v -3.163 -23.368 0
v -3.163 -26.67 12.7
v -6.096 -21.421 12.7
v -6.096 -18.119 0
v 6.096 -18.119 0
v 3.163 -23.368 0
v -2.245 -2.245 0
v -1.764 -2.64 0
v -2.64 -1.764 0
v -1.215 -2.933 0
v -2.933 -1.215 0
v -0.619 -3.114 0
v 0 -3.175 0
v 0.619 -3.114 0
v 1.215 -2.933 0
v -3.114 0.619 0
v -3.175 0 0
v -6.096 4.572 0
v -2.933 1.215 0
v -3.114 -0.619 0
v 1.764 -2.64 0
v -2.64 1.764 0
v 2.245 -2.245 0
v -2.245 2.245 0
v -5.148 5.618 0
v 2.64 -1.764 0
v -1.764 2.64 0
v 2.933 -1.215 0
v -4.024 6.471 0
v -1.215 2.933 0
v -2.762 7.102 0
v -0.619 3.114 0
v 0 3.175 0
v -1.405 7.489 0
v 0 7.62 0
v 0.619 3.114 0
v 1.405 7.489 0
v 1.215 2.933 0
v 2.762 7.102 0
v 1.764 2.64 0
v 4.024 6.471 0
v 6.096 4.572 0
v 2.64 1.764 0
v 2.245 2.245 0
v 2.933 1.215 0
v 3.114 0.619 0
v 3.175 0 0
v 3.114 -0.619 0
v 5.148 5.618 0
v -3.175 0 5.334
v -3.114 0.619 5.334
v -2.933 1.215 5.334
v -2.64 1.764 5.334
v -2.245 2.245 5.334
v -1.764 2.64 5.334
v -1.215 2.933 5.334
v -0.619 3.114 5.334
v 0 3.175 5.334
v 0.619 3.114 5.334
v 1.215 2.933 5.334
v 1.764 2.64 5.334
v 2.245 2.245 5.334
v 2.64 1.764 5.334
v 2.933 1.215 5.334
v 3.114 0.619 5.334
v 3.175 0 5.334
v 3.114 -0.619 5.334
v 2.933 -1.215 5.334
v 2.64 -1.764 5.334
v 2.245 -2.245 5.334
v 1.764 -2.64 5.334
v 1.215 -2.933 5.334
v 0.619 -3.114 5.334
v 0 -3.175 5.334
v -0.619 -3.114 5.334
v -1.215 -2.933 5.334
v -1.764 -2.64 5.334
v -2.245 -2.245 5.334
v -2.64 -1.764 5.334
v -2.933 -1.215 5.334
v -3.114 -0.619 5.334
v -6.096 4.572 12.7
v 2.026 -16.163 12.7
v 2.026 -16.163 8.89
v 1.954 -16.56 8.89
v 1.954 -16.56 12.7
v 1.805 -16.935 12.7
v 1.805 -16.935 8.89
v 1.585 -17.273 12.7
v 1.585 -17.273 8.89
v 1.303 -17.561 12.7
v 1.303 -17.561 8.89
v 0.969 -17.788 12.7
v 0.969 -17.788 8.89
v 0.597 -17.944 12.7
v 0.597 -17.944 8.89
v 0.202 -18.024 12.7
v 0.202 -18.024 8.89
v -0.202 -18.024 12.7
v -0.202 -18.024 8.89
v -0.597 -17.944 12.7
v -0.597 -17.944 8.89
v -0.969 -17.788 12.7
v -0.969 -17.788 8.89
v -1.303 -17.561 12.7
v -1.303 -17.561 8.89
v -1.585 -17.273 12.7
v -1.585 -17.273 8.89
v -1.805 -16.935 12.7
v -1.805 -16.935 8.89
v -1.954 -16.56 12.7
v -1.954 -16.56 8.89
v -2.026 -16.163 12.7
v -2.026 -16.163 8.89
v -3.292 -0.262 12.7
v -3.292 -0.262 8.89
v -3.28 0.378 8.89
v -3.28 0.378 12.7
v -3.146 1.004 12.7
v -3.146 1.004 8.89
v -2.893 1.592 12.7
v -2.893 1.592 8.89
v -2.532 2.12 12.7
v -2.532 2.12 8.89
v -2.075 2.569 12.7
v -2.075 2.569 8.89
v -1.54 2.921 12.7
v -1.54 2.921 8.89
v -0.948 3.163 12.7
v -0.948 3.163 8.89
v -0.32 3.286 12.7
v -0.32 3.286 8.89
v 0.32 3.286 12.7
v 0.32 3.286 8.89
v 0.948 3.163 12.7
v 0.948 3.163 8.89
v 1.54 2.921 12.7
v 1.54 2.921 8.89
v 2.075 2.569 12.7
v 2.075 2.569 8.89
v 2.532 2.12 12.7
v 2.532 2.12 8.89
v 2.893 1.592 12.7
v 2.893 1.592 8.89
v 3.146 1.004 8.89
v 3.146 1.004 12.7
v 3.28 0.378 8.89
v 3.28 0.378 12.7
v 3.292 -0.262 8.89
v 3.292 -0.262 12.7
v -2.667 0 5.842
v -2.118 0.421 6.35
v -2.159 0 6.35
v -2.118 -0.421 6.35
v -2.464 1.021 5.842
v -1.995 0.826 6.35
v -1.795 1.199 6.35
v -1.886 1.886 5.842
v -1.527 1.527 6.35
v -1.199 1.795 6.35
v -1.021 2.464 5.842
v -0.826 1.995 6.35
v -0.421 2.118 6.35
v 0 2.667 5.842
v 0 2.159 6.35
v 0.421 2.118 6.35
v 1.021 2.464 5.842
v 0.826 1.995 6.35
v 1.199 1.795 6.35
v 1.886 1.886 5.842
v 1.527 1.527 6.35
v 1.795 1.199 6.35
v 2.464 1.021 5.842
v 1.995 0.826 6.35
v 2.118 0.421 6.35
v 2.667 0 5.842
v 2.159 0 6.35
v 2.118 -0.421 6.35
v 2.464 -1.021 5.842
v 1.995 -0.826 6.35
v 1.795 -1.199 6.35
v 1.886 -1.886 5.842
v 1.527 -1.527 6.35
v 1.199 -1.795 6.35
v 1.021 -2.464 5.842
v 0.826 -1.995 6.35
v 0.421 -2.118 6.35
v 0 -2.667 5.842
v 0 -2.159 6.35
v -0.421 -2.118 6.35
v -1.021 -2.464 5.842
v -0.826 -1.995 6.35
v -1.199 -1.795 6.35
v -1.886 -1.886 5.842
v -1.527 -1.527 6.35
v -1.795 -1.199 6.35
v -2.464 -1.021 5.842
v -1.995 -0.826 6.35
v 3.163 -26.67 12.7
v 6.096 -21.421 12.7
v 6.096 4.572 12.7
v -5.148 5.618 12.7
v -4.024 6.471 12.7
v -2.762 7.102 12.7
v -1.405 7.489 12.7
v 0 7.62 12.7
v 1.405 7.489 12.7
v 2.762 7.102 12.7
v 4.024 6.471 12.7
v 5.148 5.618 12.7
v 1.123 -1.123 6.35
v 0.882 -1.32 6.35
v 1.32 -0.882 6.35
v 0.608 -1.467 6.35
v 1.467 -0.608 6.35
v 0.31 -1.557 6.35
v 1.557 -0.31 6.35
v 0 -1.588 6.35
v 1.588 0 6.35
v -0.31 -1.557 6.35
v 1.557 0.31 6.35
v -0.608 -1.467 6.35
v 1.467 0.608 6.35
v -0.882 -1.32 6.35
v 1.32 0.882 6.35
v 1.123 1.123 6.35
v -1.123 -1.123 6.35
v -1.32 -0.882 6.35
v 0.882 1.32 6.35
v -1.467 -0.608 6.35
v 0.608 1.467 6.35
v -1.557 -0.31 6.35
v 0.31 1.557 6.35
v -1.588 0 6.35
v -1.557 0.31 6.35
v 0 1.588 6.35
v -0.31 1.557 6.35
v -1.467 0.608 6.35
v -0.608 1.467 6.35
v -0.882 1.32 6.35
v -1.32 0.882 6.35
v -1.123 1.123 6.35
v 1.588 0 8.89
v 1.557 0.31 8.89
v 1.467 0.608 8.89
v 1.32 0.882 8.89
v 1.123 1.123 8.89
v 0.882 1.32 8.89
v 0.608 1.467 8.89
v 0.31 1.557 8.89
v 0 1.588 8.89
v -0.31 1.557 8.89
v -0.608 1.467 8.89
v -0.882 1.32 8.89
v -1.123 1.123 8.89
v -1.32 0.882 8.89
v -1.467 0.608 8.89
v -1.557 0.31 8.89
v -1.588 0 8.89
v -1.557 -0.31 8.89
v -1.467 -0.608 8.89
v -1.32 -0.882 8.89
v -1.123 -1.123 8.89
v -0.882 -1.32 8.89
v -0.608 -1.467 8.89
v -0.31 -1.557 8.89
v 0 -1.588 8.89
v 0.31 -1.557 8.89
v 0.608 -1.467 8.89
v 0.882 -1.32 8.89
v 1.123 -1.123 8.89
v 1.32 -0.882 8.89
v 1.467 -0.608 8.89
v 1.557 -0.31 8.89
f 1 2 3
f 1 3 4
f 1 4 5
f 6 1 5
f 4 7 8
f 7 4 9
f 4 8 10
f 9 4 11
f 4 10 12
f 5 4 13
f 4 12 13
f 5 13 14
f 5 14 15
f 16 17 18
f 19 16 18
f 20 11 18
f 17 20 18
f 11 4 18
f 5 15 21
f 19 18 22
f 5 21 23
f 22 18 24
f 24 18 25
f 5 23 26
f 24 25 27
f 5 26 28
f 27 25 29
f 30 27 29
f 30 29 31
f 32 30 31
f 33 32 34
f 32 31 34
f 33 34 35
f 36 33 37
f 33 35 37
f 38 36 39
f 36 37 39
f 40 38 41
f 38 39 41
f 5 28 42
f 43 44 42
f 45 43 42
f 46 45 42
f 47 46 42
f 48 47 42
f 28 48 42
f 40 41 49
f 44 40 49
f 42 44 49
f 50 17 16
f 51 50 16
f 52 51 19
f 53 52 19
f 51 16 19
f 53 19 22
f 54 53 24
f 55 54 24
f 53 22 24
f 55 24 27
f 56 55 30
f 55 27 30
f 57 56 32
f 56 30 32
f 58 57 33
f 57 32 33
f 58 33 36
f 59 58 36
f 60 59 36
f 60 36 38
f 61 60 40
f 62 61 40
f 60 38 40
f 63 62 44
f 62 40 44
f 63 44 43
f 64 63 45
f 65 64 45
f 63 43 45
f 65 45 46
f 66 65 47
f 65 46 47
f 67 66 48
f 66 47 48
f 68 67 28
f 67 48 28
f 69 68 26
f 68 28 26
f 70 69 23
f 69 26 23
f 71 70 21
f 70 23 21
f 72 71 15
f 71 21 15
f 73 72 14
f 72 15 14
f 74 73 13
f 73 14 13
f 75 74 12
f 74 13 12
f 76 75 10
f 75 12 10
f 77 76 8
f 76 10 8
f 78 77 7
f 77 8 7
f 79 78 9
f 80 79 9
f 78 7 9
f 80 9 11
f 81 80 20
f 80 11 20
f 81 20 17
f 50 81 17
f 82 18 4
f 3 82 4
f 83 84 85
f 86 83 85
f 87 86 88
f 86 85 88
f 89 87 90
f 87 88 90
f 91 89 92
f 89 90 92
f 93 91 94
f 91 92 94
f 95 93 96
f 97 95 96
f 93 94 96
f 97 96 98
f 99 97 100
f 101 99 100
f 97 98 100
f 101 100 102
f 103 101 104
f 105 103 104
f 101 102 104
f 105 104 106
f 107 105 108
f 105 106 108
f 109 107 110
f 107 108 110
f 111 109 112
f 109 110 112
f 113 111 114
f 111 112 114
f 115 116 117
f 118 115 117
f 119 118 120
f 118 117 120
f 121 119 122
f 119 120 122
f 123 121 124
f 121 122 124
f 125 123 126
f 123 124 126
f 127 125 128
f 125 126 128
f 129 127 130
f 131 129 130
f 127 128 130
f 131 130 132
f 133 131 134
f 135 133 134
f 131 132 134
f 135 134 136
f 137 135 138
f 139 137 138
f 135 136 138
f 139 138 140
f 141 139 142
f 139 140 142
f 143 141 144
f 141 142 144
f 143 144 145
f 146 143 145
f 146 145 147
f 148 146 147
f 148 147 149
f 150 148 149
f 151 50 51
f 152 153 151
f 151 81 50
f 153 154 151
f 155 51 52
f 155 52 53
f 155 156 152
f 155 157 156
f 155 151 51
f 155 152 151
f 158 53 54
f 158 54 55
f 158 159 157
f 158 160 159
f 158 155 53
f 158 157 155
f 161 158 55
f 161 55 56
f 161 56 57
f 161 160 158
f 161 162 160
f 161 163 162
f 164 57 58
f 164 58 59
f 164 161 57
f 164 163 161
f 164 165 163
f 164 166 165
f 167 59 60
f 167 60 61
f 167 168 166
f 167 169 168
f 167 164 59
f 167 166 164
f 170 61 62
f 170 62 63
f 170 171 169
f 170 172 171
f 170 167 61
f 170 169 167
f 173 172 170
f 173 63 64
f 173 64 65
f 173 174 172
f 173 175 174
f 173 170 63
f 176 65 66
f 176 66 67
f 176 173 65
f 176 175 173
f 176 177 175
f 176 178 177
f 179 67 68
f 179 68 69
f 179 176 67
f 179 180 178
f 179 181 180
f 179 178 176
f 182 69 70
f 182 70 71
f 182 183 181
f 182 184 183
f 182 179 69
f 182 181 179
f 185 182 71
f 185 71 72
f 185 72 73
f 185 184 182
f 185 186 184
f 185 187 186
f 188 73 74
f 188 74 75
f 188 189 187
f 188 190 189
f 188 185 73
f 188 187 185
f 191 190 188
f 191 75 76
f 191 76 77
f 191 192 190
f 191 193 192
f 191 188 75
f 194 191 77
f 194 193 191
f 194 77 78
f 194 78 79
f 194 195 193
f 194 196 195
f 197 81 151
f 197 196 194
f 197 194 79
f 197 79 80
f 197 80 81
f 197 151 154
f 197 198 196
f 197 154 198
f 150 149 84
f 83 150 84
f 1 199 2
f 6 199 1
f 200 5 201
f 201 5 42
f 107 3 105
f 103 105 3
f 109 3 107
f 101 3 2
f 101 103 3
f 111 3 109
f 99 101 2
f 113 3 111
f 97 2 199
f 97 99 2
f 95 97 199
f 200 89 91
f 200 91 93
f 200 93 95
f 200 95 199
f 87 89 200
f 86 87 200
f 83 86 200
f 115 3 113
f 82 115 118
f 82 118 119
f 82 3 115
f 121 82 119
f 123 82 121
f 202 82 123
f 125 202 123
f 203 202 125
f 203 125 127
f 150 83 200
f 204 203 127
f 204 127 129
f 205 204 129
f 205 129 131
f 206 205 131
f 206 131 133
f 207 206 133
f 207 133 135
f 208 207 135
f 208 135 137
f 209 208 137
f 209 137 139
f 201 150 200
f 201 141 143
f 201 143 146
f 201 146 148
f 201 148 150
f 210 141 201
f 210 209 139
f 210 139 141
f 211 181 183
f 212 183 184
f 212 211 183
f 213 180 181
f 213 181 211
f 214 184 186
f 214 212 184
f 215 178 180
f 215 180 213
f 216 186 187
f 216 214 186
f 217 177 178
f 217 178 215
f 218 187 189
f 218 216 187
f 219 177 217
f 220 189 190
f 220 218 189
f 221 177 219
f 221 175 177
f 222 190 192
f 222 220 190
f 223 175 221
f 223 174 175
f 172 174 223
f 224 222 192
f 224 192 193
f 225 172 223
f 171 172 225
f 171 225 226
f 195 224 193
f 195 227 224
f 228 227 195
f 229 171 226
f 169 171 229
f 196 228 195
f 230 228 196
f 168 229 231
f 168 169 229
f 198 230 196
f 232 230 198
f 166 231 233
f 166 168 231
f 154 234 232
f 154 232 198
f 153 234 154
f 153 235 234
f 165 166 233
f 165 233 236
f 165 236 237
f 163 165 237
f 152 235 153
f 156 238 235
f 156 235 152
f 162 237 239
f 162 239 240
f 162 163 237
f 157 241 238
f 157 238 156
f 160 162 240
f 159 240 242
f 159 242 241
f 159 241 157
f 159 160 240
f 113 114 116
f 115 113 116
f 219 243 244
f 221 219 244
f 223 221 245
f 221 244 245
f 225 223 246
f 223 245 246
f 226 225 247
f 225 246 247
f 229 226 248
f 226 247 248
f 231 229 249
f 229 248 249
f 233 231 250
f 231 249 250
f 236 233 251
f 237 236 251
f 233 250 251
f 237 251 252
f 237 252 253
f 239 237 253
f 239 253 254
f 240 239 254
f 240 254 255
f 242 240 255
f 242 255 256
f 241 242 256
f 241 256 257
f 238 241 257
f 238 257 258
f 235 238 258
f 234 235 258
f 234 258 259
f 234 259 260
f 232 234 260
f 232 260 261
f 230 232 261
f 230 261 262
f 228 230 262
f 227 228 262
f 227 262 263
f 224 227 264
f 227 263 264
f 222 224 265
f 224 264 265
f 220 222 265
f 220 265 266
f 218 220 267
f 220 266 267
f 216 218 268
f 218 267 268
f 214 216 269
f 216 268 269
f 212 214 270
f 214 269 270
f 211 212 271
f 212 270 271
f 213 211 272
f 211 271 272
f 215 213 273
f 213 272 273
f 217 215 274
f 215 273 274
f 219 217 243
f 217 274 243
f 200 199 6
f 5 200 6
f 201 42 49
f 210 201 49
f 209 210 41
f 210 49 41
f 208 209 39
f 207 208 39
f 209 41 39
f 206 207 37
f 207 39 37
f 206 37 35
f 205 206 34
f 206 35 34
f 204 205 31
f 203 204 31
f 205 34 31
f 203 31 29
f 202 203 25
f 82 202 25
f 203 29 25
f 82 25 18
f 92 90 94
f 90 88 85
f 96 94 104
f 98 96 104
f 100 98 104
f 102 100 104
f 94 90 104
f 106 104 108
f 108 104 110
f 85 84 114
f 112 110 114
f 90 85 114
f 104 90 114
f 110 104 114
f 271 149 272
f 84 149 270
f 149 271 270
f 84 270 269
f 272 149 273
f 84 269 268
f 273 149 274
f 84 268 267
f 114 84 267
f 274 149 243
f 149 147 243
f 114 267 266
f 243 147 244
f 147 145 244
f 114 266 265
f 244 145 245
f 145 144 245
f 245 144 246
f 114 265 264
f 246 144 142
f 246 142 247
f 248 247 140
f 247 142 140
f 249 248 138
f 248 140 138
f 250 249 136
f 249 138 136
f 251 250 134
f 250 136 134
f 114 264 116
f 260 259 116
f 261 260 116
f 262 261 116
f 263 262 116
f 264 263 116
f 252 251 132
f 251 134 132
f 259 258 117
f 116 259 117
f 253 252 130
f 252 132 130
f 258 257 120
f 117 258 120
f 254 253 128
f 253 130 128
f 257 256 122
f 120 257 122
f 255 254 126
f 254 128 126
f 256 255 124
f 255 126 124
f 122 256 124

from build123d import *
from OCP.BRepFilletAPI import BRepFilletAPI_MakeChamfer

# Parameters (mm, degrees)
BOSS_EXTRUDE1_DEPTH     = 12.7
CUT_EXTRUDE1_DEPTH      = 37.367265501
CUT_EXTRUDE1_DEPTH_BACK = 3.81
CUT_EXTRUDE2_DEPTH      = 38.86900643
SKETCH4_R               = 1.5875
CUT_EXTRUDE3_DEPTH      = 29.765990614
SKETCH5_R               = 3.175
CUT_EXTRUDE4_DEPTH      = 6.35
CHAMFER1_SIZE           = 1.016
CHAMFER2_SIZE           = 5.08
CHAMFER2_SIZE2          = 2.932939367


with BuildPart() as part:
    # Sketch1 → Boss-Extrude1 (new body)
    with BuildSketch(Plane.XY):
        with BuildLine():
            Line((-6.096, 4.572), (-6.096, -33.528))
            Line((-6.096, -33.528), (6.096, -33.528))
            Line((6.096, -33.528), (6.096, 4.572))
            ThreePointArc((6.096, 4.572), (0, 7.62), (-6.096, 4.572))
        make_face()
    extrude(amount=BOSS_EXTRUDE1_DEPTH)

    # Sketch2 → Cut-Extrude1 (cut, two sides: drawn at the far end of the back side and taken through both)
    with BuildSketch(Plane.XY.offset(12.7).offset(-CUT_EXTRUDE1_DEPTH_BACK)):
        with BuildLine():
            Line((3.291584227, -0.262063492), (2.025590294, -16.163269841))
            ThreePointArc((2.025590294, -16.163269841), (0, -18.034), (-2.025590294, -16.163269841))
            Line((-2.025590294, -16.163269841), (-3.291584227, -0.262063492))
            ThreePointArc((-3.291584227, -0.262063492), (0, 3.302), (3.291584227, -0.262063492))
        make_face()
    extrude(amount=CUT_EXTRUDE1_DEPTH + CUT_EXTRUDE1_DEPTH_BACK, mode=Mode.SUBTRACT)

    # Sketch3 → Cut-Extrude2 (cut, through all)
    with BuildSketch(Plane(origin=(6.096, 0, 0), x_dir=(0, 0, -1), z_dir=(1, 0, 0))):
        Polygon((-12.7, -33.528), (-12.7, -26.67), (0, -23.368), (0, -33.528), align=None)
    extrude(amount=-CUT_EXTRUDE2_DEPTH, mode=Mode.SUBTRACT)

    # Sketch4 → Cut-Extrude3 (cut, through all)
    with BuildSketch(Plane.XY.offset(8.89)):
        Circle(SKETCH4_R)
    extrude(amount=-CUT_EXTRUDE3_DEPTH, mode=Mode.SUBTRACT)

    # Sketch5 → Cut-Extrude4 (cut)
    with BuildSketch(Plane(origin=(0, 0, 0), x_dir=(-1, 0, 0), z_dir=(0, 0, -1))):
        Circle(SKETCH5_R)
    extrude(amount=-CUT_EXTRUDE4_DEPTH, mode=Mode.SUBTRACT)

    # Chamfer1
    chamfer1_edges = [part.edges().sort_by_distance(p)[0] for p in [
        (3.175, 0, 6.35),
    ]]
    chamfer(chamfer1_edges, length=CHAMFER1_SIZE)

    # Chamfer2: one chamfer whose edges measure the first distance from different faces: ONE call of the kernel's chamfer builder (chamfer() names one face for all edges)
    chamfer2_edges_1 = [part.edges().sort_by_distance(p)[0] for p in [
        (-6.096, -25.019, 6.35),
    ]]
    chamfer2_side_1 = [part.faces().sort_by_distance(p)[0] for p in [
        (-6.096, -10.238852647, 6.468097282),
    ]]
    chamfer2_edges_2 = [part.edges().sort_by_distance(p)[0] for p in [
        (6.096, -25.019, 6.35),
    ]]
    chamfer2_side_2 = [part.faces().sort_by_distance(p)[0] for p in [
        (6.096, -10.238852647, 6.468097282),
    ]]
    chamfer2 = BRepFilletAPI_MakeChamfer(part.part.solid().wrapped)
    for e in chamfer2_edges_1:
        chamfer2.Add(CHAMFER2_SIZE, CHAMFER2_SIZE2, e.wrapped, chamfer2_side_1[0].wrapped)  # the first distance lies on this face
    for e in chamfer2_edges_2:
        chamfer2.Add(CHAMFER2_SIZE, CHAMFER2_SIZE2, e.wrapped, chamfer2_side_2[0].wrapped)  # the first distance lies on this face
    add(Compound.cast(chamfer2.Shape()), mode=Mode.REPLACE)


solid = part.part
